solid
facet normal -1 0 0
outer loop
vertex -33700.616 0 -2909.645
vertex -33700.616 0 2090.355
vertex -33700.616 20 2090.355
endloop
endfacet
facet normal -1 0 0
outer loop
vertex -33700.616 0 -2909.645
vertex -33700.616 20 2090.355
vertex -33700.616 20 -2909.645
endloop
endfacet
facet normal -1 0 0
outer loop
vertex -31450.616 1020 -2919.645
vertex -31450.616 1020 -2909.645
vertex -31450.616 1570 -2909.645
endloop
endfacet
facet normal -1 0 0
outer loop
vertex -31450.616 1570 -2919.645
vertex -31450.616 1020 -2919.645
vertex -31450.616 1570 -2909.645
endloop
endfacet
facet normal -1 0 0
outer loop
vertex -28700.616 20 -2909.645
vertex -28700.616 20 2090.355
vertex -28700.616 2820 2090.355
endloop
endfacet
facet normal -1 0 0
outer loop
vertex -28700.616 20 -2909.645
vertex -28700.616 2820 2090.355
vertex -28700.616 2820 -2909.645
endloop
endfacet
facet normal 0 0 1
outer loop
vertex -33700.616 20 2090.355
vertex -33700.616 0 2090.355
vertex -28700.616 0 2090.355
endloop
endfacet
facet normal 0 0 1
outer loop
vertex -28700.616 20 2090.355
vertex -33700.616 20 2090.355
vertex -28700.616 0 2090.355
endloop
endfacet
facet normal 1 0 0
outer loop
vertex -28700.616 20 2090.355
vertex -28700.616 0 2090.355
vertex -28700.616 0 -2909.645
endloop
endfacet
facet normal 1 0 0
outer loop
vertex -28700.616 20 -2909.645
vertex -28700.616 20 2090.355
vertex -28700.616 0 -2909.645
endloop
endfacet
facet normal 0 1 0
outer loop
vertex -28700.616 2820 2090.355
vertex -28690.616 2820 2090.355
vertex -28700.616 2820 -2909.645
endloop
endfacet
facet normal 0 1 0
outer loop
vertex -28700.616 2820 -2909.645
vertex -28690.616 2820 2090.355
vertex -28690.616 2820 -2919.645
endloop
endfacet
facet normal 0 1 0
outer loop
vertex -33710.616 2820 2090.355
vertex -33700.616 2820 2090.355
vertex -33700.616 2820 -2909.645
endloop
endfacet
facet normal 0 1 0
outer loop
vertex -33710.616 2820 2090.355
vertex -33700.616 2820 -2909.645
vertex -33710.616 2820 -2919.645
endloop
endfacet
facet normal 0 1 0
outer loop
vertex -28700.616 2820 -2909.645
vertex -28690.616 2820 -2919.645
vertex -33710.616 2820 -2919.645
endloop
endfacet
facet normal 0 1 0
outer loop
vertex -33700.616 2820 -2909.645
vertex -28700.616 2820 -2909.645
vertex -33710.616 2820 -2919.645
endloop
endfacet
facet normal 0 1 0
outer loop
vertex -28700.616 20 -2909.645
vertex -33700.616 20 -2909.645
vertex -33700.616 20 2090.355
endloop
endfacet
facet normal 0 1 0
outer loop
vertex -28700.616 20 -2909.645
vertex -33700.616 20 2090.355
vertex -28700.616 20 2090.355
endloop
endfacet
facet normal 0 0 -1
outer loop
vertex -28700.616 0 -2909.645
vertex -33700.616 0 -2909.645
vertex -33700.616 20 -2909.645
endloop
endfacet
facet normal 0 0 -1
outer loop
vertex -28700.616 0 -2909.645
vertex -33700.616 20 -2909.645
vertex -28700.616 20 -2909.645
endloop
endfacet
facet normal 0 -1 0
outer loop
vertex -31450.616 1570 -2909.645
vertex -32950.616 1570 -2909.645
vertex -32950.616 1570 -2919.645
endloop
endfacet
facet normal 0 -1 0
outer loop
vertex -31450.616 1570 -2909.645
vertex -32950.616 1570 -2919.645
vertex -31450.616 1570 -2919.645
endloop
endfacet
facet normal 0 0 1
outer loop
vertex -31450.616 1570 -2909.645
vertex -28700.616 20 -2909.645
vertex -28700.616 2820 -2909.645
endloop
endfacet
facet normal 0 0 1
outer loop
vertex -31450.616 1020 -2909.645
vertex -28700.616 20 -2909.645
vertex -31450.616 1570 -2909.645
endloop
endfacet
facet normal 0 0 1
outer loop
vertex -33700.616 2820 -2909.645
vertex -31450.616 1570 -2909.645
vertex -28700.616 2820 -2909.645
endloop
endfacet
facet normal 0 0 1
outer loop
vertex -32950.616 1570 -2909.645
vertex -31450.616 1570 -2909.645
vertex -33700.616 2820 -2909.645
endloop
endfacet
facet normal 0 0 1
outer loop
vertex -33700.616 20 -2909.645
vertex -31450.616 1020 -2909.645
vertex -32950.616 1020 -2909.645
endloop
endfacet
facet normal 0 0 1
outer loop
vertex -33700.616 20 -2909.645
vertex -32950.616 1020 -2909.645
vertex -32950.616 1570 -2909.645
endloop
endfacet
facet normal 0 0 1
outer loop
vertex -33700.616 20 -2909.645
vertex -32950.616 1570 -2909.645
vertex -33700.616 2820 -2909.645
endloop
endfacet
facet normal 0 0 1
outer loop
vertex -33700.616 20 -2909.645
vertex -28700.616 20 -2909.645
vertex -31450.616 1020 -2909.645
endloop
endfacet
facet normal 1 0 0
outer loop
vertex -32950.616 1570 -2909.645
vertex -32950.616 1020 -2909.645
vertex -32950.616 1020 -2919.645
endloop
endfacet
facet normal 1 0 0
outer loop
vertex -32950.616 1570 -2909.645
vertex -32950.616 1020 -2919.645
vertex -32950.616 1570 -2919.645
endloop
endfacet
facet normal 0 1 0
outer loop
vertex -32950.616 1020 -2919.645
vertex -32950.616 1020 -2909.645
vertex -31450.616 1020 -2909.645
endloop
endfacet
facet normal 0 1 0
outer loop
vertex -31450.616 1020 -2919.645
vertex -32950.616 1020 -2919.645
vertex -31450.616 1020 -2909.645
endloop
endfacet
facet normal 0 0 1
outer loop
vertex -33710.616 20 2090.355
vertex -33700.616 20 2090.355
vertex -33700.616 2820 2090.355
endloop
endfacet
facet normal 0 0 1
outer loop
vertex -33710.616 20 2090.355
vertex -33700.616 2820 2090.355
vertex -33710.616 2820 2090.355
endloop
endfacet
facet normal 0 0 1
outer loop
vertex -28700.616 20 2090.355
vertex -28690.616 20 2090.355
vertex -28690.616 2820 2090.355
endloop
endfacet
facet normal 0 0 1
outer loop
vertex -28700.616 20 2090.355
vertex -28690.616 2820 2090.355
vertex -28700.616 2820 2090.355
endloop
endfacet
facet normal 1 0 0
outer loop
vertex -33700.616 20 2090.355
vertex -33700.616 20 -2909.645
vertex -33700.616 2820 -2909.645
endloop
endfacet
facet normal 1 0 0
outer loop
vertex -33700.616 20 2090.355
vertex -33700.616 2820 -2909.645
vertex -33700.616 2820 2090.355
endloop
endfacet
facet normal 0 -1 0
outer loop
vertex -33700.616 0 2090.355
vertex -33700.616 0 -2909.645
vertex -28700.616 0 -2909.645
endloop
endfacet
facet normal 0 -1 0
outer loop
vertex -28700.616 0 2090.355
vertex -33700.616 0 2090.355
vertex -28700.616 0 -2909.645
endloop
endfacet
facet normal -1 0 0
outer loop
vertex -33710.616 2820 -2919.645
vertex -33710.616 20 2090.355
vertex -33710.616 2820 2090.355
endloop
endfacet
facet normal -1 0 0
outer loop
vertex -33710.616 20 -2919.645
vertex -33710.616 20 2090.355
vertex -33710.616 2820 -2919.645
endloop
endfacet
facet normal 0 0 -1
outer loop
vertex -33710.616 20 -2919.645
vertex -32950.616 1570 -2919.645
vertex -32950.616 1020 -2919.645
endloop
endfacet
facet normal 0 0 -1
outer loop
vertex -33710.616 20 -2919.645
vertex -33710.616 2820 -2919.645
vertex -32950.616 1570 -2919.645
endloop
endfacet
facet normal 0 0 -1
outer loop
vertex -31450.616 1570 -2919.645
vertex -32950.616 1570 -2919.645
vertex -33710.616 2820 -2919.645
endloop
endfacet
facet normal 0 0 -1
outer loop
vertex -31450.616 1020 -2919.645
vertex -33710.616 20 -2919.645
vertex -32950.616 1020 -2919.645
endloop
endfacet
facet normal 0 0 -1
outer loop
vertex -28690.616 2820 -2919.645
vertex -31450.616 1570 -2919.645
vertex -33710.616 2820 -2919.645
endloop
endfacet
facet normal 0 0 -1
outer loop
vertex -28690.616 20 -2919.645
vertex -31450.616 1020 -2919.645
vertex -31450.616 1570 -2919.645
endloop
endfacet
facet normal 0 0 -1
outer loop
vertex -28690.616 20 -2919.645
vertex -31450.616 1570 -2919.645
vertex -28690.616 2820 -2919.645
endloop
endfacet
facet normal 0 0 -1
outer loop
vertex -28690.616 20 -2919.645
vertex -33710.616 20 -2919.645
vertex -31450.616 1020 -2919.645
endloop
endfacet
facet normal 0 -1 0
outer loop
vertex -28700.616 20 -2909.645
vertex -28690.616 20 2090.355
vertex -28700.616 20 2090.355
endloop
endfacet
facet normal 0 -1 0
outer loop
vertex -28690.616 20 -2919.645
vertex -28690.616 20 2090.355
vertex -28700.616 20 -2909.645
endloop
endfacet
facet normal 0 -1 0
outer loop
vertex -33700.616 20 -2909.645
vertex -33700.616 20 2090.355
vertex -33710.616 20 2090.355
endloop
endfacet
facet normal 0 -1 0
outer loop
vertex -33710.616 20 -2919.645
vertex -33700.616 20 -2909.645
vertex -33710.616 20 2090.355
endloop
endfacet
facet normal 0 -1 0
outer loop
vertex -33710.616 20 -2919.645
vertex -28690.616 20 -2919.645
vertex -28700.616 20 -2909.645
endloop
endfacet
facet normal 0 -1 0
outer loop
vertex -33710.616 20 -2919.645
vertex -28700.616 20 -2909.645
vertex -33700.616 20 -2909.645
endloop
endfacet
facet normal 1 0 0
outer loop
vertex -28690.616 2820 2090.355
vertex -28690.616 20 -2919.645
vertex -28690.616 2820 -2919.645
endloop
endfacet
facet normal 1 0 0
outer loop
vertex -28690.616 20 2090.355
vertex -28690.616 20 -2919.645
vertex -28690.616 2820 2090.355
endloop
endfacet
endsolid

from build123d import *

# Parameters (mm, degrees)
SKETCH1_W           = 5000
SKETCH1_H           = 5000
BOSS_EXTRUDE1_DEPTH = 20
EXTRUDE_THIN1_DEPTH = 2800
SKETCH5_W           = 1500
SKETCH5_H           = 550
CUT_EXTRUDE1_DEPTH  = 10


with BuildPart() as part:
    # Sketch1 → Boss-Extrude1 (new body)
    with BuildSketch(Plane(origin=(0, 0, 0), x_dir=(1, 0, 0), z_dir=(0, 1, 0))):
        with Locations((-31200.616142501, 409.645456317)):
            Rectangle(SKETCH1_W, SKETCH1_H)
    extrude(amount=BOSS_EXTRUDE1_DEPTH)


with BuildPart() as body_2:
    # Sketch4 → Extrude-Thin1 (new body)
    with BuildSketch(Plane(origin=(0, 20, 0), x_dir=(1, 0, 0), z_dir=(0, 1, 0))):
        Polygon((-28700.616142501, -2090.354543683), (-28700.616142501, 2909.645456317), (-33700.616142501, 2909.645456317), (-33700.616142501, -2090.354543683), (-33710.616142501, -2090.354543683), (-33710.616142501, 2919.645456317), (-28690.616142501, 2919.645456317), (-28690.616142501, -2090.354543683), align=None)
    extrude(amount=EXTRUDE_THIN1_DEPTH)

    # Sketch5 → Cut-Extrude1 (cut)
    with BuildSketch(Plane.XY.offset(-2909.645456317)):
        with Locations((-32200.616142501, 1295)):
            Rectangle(SKETCH5_W, SKETCH5_H)
    extrude(amount=-CUT_EXTRUDE1_DEPTH, mode=Mode.SUBTRACT)


solid = Compound([part.part, body_2.part])
